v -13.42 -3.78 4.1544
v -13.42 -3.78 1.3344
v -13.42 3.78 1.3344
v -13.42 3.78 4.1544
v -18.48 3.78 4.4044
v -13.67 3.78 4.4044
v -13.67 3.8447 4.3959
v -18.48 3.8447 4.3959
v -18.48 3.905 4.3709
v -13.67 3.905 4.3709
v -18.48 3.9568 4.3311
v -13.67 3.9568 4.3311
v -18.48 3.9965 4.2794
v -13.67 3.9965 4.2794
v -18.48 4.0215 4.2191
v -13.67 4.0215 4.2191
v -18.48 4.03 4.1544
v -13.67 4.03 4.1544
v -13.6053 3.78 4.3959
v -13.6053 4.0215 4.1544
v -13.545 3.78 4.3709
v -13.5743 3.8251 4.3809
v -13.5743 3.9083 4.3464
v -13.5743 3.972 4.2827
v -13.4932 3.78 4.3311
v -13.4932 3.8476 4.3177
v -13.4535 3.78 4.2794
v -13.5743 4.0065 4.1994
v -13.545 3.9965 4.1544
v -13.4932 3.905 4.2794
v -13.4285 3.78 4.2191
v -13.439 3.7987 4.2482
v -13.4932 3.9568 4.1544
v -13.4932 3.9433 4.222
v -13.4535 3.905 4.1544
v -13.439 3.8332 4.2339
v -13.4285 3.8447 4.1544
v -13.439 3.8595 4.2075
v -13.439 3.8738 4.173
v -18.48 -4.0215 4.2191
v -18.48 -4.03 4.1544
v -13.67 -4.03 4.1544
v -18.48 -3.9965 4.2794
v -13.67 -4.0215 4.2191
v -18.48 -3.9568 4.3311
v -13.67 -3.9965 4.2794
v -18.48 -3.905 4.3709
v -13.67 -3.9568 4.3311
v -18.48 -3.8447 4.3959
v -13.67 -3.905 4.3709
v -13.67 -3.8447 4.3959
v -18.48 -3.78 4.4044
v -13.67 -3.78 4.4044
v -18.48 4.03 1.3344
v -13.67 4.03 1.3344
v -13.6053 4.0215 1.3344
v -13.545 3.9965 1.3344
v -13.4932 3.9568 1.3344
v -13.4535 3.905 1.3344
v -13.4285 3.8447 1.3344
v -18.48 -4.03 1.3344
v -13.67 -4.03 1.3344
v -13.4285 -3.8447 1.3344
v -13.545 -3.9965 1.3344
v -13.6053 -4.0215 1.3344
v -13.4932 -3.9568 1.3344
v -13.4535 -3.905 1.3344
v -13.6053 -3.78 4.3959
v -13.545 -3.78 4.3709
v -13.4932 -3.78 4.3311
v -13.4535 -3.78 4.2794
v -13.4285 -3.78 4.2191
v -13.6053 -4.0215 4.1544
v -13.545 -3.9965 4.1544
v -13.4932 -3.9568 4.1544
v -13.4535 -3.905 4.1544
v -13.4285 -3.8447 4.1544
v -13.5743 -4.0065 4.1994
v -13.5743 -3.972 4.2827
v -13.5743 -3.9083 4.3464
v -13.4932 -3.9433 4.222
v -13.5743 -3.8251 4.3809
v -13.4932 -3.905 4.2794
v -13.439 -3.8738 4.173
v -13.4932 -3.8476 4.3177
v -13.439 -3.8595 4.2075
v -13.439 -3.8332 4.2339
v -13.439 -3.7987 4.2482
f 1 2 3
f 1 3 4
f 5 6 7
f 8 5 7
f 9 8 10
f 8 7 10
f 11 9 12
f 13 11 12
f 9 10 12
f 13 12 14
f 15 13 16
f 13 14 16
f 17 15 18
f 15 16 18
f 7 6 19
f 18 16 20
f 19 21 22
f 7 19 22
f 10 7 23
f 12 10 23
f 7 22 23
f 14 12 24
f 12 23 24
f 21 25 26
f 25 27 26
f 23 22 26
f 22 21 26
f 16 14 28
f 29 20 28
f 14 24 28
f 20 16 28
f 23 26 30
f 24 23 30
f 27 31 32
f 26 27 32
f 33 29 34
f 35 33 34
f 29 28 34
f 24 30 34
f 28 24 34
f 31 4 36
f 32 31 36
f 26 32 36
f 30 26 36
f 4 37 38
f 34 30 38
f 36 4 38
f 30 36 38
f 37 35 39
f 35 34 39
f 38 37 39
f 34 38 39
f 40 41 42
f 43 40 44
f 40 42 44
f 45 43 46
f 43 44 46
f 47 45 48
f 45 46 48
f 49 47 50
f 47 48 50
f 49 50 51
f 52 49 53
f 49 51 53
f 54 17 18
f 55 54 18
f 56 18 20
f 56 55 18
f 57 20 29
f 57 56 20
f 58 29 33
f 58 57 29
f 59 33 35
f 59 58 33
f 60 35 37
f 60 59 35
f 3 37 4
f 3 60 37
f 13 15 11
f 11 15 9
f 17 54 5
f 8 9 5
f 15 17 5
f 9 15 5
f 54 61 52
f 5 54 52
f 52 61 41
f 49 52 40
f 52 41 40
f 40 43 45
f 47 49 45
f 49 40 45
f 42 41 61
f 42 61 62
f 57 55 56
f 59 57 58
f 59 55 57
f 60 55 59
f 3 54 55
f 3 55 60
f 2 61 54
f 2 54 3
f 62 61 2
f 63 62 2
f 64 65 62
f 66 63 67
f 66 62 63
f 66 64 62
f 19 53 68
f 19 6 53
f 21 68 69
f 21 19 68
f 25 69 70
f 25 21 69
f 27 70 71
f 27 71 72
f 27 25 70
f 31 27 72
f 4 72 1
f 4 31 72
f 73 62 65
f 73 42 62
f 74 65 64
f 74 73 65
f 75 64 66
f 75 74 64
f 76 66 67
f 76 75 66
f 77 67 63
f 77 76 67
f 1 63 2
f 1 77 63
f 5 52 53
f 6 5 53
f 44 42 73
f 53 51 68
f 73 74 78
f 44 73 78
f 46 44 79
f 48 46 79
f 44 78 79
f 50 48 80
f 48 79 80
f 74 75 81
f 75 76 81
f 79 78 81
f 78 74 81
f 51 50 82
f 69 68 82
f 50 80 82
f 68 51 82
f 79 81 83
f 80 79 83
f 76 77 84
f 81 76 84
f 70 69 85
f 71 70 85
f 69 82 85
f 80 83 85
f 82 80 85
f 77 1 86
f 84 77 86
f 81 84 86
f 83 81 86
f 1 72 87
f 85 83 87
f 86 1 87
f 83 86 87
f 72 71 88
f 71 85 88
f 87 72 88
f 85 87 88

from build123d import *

# Parameters (mm, degrees)
SKETCH002_W  = 5.06
SKETCH002_H  = 3.07
PAD002_DEPTH = 4.03
FILLET_R     = 0.25
FILLET003_R  = 0.25


with BuildPart() as part:
    # Sketch002 → Pad002 (new body, symmetric)
    with BuildSketch(Plane.XZ):
        with Locations((-15.95, 2.86937)):
            Rectangle(SKETCH002_W, SKETCH002_H)
    extrude(amount=PAD002_DEPTH, both=True)

    # Fillet
    fillet_edges = [part.edges().sort_by_distance(p)[0] for p in [
        (-15.95, 4.03, 4.40437),
        (-15.95, -4.03, 4.40437),
    ]]
    fillet(fillet_edges, radius=FILLET_R)

    # Fillet003
    fillet003_edges = [part.edges().sort_by_distance(p)[0] for p in [
        (-13.42, 0, 4.40437),
    ]]
    fillet(fillet003_edges, radius=FILLET003_R)


solid = part.part
